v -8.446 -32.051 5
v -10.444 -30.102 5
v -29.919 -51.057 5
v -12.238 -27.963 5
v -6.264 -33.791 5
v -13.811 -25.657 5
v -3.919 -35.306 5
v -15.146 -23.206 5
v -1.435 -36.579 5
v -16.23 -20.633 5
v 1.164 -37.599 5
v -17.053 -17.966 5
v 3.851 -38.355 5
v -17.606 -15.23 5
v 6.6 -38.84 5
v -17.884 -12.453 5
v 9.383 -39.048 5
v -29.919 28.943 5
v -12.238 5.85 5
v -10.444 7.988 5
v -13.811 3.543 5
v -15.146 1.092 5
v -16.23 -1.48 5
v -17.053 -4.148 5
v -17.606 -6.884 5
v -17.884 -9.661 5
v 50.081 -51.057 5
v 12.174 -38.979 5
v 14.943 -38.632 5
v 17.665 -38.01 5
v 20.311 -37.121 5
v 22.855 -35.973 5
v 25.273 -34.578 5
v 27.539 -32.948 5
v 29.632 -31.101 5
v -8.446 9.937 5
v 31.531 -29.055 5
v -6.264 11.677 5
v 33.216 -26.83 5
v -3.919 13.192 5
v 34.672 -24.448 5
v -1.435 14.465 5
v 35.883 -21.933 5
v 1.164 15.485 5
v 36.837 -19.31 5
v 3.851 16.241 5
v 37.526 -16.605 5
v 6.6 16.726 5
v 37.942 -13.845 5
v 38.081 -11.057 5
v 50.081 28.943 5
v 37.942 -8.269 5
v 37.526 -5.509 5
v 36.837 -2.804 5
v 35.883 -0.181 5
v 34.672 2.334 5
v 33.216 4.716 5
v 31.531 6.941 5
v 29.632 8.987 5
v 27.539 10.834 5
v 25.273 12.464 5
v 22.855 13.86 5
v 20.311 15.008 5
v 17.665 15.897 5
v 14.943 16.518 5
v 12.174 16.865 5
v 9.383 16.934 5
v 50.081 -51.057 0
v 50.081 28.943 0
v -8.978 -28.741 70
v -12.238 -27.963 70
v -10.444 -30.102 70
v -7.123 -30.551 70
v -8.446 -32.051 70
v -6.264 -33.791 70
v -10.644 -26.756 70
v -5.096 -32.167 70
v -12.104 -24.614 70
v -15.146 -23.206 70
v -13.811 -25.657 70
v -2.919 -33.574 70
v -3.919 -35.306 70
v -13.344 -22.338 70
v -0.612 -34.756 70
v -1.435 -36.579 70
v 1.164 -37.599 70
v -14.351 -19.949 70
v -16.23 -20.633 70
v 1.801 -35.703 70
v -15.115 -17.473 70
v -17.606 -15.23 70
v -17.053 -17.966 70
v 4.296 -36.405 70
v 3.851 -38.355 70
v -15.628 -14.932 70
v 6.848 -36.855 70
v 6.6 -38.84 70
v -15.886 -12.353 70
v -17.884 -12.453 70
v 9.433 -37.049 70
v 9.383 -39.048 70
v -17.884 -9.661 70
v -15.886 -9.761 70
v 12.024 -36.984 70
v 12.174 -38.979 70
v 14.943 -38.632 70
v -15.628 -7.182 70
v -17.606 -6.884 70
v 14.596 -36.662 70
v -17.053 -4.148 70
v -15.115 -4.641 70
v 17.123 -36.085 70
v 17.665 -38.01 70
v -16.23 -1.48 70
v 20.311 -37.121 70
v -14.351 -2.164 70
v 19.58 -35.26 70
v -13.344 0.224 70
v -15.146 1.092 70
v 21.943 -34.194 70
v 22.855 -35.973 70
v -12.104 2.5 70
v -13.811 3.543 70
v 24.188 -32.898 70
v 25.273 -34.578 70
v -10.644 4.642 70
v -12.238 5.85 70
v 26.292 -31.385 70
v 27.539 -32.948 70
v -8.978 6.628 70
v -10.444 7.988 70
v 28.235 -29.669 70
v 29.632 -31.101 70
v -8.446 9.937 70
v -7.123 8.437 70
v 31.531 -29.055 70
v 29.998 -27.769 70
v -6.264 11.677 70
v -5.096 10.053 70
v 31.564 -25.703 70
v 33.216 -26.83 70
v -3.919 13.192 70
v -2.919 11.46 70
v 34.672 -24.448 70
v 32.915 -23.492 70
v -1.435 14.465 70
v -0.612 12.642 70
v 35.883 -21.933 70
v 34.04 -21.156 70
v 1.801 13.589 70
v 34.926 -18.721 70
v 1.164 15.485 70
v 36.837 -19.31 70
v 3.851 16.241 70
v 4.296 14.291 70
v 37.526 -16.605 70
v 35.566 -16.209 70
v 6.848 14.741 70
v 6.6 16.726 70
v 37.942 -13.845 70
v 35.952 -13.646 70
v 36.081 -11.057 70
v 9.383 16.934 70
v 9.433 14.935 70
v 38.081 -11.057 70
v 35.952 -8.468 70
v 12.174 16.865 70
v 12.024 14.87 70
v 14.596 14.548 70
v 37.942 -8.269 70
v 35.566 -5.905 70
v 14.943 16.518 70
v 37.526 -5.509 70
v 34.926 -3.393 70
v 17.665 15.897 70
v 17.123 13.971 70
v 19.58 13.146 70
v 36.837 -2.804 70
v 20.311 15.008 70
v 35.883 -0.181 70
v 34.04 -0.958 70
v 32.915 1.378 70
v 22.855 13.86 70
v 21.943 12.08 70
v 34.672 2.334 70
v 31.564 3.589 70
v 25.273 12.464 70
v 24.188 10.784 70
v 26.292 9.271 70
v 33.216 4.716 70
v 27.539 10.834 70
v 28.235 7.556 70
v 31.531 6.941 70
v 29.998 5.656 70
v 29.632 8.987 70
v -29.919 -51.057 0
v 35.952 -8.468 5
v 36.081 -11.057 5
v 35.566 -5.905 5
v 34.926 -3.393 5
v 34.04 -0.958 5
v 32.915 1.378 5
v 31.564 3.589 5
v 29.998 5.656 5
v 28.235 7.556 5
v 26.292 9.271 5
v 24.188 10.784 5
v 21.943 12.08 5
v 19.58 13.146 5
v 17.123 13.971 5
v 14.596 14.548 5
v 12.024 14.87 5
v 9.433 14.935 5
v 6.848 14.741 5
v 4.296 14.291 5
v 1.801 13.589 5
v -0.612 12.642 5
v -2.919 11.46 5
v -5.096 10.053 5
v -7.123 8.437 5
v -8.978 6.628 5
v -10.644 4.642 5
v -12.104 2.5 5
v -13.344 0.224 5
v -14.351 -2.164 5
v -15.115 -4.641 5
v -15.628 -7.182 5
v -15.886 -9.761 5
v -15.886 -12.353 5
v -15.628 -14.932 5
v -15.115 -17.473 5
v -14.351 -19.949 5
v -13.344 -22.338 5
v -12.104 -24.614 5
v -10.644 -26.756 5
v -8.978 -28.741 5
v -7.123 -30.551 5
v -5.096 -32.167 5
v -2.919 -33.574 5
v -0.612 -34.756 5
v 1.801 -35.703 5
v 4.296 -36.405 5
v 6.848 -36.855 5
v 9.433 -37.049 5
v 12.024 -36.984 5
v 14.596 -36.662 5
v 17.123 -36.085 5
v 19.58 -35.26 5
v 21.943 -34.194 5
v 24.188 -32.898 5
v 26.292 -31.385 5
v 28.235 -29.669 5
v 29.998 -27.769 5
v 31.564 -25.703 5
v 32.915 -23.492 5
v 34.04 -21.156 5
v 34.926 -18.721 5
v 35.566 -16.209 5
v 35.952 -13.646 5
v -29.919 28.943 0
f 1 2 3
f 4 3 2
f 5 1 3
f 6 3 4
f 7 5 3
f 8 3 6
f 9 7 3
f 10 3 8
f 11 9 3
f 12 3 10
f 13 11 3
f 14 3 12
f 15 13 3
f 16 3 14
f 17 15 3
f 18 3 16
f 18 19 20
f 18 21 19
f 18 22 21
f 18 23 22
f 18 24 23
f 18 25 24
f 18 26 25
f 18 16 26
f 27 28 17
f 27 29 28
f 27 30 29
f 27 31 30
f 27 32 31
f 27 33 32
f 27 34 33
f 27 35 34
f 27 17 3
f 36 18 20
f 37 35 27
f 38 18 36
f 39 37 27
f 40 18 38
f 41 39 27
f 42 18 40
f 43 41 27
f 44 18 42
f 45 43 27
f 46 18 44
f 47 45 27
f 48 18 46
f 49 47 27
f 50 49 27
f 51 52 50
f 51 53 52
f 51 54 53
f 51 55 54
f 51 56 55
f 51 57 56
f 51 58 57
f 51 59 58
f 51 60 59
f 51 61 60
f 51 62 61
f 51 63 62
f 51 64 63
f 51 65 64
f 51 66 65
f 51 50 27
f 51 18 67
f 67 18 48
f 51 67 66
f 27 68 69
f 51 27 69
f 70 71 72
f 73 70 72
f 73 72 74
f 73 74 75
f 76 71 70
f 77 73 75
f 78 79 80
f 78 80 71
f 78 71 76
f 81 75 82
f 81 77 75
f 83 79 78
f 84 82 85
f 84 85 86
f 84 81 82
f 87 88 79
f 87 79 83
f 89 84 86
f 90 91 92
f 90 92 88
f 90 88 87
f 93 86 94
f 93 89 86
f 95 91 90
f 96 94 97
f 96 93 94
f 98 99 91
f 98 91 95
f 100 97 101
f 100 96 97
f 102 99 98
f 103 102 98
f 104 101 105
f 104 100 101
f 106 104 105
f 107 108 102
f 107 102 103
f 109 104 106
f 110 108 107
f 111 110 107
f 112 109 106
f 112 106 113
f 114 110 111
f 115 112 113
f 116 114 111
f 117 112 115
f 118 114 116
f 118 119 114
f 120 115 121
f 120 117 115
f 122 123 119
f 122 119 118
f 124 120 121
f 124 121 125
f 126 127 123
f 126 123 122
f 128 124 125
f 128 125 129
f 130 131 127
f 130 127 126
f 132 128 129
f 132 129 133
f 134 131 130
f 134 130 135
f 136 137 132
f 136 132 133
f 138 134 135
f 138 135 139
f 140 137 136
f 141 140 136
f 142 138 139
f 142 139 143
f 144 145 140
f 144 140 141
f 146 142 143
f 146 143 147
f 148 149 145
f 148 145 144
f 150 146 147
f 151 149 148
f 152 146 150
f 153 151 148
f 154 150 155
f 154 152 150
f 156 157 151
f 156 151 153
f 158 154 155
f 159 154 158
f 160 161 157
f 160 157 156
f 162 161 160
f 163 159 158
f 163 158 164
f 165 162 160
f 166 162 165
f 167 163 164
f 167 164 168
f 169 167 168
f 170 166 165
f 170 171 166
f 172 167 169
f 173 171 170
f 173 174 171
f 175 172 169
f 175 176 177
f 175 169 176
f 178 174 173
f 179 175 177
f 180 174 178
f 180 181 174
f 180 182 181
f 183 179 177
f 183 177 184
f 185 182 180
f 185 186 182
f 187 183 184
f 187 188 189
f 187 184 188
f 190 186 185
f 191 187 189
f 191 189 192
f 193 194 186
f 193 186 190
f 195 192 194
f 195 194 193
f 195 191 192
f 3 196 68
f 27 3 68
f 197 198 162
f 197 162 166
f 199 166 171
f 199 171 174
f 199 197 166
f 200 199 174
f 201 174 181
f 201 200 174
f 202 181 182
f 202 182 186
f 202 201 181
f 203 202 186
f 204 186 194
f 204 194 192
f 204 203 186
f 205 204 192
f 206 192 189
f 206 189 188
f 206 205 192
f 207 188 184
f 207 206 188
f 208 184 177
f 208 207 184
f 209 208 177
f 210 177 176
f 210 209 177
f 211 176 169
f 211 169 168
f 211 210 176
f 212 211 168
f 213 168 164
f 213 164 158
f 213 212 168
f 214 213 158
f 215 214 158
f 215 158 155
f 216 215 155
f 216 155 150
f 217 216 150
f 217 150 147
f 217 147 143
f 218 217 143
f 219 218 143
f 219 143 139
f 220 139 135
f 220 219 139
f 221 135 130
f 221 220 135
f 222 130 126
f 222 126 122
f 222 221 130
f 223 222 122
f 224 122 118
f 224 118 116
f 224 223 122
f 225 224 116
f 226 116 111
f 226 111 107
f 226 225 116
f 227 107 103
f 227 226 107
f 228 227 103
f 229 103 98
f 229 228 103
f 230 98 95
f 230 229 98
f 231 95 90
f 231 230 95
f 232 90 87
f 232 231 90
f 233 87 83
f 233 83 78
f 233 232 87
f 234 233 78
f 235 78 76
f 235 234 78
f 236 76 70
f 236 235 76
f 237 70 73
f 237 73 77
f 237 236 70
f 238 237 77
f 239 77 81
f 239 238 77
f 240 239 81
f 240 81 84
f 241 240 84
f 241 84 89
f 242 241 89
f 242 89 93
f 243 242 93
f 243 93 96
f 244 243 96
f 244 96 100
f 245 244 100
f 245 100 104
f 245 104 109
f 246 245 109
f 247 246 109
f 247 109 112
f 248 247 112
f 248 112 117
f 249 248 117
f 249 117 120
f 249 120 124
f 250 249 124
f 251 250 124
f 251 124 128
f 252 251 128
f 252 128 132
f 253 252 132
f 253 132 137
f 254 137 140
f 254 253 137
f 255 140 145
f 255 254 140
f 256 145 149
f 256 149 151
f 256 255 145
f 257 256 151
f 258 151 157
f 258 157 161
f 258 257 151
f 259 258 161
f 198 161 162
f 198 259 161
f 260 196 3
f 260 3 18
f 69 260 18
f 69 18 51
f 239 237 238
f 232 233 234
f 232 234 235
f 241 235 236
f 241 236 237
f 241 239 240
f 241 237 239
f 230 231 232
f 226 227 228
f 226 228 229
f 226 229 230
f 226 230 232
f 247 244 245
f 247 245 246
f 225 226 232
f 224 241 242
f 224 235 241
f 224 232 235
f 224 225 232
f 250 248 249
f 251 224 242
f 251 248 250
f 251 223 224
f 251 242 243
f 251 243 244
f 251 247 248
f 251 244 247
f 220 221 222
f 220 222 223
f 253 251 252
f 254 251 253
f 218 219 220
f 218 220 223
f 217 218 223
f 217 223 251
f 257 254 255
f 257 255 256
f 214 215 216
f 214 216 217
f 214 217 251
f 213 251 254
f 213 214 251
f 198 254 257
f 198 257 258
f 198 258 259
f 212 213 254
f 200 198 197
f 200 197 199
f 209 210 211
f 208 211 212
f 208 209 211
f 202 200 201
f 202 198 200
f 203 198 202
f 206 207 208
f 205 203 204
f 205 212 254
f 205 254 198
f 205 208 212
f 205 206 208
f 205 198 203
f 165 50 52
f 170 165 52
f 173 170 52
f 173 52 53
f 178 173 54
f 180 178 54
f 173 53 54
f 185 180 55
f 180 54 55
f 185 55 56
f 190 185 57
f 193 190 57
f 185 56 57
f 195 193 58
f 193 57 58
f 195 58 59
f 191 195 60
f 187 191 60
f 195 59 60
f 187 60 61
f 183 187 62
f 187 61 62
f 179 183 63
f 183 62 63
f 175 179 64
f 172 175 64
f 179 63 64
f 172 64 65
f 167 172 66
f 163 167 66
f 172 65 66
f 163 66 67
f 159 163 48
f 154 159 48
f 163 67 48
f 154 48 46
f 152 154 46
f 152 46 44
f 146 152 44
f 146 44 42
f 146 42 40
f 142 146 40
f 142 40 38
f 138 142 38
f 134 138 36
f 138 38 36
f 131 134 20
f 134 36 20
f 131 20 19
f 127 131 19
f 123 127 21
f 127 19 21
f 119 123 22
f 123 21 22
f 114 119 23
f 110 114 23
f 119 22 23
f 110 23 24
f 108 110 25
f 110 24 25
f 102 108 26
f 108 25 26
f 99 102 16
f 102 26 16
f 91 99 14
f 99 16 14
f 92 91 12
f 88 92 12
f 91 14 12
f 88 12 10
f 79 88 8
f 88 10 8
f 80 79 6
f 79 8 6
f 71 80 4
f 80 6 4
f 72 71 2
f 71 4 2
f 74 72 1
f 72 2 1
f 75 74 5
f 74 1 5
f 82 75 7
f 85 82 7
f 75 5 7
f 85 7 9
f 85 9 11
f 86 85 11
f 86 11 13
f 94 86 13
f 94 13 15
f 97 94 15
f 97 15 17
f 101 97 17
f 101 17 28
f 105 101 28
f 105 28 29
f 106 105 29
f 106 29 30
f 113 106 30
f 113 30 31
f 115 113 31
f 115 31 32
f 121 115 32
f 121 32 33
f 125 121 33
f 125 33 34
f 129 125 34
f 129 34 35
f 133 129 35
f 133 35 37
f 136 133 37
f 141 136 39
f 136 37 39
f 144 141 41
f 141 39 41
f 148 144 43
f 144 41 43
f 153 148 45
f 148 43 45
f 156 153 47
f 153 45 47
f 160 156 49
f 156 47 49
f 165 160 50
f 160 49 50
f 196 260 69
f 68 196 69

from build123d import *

# Parameters (mm, degrees)
SKETCH1_W           = 80
SKETCH1_H           = 80
BOSS_EXTRUDE1_DEPTH = 5
SKETCH2_R           = 28
SKETCH2_R_2         = 26
EXTRUDE_THIN1_DEPTH = 65


with BuildPart() as part:
    # Sketch1 → Boss-Extrude1 (new body)
    with BuildSketch(Plane.XY):
        with Locations((10.081300813, -11.056910569)):
            Rectangle(SKETCH1_W, SKETCH1_H)
    extrude(amount=BOSS_EXTRUDE1_DEPTH)

    # Sketch2 → Extrude-Thin1 (add)
    with BuildSketch(Plane.XY.offset(5)):
        with Locations((10.081300813, -11.056910569)):
            Circle(SKETCH2_R)
        with Locations((10.081300813, -11.056910569)):
            Circle(SKETCH2_R_2, mode=Mode.SUBTRACT)
    extrude(amount=EXTRUDE_THIN1_DEPTH)


solid = part.part
